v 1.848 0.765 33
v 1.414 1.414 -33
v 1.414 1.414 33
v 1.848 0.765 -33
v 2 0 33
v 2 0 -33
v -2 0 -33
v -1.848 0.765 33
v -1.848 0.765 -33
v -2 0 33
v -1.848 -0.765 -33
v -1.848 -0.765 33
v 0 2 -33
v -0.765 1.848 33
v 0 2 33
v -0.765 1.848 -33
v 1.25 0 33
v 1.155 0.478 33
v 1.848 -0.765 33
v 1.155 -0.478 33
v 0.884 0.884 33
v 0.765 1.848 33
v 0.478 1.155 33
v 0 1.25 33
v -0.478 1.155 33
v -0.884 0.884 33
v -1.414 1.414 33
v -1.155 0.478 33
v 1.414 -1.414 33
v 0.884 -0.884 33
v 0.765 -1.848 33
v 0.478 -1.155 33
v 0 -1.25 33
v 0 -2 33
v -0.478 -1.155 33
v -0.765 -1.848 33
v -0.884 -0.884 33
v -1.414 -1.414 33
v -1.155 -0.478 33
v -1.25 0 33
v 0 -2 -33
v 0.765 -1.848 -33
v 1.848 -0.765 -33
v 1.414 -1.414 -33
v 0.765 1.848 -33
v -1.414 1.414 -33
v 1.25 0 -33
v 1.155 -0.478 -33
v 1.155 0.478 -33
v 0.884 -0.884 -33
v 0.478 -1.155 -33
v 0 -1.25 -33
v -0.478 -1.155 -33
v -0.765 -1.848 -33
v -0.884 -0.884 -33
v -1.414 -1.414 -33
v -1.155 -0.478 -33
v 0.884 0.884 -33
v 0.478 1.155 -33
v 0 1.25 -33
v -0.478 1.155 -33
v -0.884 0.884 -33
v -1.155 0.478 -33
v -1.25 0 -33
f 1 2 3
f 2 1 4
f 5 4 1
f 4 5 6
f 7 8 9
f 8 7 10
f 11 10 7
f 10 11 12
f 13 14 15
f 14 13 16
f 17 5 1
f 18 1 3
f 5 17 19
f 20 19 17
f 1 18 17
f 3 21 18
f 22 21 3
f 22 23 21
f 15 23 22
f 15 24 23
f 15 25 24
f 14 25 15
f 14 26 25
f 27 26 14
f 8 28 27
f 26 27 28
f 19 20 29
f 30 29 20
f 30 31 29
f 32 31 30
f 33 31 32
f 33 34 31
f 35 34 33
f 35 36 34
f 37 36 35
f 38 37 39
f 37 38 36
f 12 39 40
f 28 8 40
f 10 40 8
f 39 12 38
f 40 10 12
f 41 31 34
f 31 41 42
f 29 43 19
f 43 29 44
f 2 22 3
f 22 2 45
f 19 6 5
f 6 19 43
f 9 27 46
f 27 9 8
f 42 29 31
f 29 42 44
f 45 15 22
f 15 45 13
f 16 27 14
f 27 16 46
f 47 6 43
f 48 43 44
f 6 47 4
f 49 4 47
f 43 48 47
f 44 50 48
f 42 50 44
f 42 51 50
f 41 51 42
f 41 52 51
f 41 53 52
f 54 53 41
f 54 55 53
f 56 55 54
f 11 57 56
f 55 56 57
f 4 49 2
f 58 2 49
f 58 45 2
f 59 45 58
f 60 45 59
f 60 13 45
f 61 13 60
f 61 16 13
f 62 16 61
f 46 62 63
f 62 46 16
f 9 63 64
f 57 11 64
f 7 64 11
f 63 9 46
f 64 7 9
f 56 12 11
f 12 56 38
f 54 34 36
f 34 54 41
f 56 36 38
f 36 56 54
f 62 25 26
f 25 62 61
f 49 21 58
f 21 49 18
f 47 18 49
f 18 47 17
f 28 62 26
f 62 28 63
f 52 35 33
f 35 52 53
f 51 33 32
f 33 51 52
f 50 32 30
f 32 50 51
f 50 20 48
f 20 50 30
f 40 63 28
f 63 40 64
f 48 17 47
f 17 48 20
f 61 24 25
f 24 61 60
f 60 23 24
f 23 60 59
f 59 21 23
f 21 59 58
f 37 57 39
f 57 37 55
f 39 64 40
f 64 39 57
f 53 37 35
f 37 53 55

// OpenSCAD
// COBRA Tendon Guide - 66.0mm

$fn = 16;

difference() {
    cylinder(h=66.0, d=4, center=true);
    cylinder(h=68.0, d=2.5, center=true);
}
